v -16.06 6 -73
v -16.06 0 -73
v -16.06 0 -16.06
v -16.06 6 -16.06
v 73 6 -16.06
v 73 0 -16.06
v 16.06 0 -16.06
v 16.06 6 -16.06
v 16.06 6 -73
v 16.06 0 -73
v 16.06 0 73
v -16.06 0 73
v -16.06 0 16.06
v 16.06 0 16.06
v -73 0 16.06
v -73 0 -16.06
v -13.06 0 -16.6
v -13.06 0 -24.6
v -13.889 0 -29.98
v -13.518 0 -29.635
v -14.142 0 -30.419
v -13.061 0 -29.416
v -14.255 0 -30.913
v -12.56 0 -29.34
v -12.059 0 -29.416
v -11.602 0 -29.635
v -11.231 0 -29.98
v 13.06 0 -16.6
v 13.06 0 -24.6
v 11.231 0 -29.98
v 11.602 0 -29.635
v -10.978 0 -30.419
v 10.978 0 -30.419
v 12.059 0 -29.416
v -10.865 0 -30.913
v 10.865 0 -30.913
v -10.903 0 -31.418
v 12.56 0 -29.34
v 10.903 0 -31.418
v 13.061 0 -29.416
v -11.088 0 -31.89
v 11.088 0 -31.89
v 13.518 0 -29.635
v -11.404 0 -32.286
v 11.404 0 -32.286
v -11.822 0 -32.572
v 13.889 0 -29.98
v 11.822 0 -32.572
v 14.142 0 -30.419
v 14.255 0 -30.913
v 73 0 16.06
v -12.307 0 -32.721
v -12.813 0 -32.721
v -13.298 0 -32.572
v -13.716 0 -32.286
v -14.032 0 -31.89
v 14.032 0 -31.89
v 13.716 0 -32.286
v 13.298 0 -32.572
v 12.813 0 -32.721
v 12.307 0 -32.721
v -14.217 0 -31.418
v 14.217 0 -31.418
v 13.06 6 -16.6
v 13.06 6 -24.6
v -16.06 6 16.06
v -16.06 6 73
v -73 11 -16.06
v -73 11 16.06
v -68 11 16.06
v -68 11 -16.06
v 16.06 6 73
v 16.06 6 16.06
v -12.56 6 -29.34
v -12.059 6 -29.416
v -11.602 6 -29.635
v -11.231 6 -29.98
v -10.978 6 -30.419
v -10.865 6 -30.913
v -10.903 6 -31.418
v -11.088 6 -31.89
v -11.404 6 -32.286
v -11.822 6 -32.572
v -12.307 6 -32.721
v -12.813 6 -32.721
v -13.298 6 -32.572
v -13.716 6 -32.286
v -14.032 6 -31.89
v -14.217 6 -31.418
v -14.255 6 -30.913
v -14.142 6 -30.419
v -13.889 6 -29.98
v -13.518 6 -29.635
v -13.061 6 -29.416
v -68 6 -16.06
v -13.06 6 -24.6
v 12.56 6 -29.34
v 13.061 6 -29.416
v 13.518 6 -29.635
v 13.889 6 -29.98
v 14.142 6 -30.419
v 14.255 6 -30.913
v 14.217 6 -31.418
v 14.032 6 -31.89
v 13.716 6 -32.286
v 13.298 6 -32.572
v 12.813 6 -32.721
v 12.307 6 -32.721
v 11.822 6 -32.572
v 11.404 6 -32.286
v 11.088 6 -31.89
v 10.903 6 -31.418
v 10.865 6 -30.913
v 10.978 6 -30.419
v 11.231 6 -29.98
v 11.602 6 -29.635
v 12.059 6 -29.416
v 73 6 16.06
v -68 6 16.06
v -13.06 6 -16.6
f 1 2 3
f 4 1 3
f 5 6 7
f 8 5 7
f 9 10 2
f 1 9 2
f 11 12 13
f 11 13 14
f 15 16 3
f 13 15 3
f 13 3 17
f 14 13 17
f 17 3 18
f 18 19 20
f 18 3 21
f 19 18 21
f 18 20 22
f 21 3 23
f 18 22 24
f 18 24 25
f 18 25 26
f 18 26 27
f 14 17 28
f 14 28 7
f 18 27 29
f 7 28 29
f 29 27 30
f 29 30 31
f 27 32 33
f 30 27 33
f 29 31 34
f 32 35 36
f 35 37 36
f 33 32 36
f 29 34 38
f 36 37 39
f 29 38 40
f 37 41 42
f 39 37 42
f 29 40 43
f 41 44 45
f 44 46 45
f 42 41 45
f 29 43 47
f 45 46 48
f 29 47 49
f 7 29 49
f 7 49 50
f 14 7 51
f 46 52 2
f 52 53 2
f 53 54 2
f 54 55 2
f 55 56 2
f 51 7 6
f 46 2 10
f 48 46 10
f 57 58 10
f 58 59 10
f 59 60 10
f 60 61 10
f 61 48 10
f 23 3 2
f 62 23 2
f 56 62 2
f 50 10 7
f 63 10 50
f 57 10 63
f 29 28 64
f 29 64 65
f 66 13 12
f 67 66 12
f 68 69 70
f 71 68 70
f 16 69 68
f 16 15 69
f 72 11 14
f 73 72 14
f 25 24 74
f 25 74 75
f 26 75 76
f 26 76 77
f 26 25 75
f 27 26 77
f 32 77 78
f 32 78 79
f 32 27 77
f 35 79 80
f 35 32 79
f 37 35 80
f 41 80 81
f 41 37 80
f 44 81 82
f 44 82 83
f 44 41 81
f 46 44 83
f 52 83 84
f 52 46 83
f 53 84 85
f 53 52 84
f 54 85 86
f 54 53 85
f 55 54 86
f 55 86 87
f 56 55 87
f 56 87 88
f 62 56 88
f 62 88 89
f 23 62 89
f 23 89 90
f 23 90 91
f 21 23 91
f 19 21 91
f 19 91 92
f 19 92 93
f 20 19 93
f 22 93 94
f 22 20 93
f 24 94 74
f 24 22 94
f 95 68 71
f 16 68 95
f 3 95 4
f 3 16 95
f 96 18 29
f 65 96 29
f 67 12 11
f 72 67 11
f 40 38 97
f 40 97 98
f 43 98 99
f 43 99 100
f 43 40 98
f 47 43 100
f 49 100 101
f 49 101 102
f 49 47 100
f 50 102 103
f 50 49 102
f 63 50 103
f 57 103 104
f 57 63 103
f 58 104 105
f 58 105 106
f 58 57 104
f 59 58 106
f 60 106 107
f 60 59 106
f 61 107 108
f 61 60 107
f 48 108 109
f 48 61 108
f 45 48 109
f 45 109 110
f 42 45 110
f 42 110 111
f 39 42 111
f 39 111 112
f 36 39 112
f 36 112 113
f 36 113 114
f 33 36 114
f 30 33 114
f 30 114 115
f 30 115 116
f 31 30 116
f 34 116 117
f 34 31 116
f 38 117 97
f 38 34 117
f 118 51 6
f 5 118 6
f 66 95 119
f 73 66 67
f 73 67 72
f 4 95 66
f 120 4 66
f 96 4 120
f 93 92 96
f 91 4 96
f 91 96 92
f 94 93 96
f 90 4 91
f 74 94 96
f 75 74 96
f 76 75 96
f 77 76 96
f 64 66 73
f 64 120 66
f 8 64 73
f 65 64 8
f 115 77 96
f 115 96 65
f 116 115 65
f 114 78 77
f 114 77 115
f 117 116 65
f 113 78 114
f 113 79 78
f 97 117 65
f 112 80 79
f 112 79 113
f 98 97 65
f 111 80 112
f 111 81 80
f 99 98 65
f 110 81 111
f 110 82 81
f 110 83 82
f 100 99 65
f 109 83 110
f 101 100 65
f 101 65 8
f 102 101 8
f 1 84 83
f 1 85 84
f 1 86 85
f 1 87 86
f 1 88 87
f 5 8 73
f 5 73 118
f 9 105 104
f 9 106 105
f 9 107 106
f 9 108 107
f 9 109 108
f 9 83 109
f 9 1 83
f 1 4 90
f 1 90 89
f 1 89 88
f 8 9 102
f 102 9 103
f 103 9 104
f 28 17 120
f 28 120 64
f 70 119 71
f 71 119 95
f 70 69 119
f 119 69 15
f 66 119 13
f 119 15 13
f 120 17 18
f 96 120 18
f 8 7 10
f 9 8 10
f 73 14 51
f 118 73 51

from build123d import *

# Parameters (mm, degrees)
SKETCH21_R           = 1.7
SKETCH21_W           = 26.12
SKETCH21_H           = 8
BOSS_EXTRUDE18_DEPTH = 6
SKETCH22_W           = 5
SKETCH22_H           = 32.12
BOSS_EXTRUDE19_DEPTH = 5


with BuildPart() as part:
    # Sketch21 → Boss-Extrude18 (new body)
    with BuildSketch(Plane(origin=(0, 0, 0), x_dir=(1, 0, 0), z_dir=(0, 1, 0))):
        Polygon((0, 73), (-16.06, 73), (-16.06, 16.06), (-73, 16.06), (-73, 0), (-73, -16.06), (-16.06, -16.06), (-16.06, -73), (0, -73), (16.06, -73), (16.06, -16.06), (73, -16.06), (73, 0), (73, 16.06), (16.06, 16.06), (16.06, 73), align=None)
        with Locations(Location((-12.56, 31.04, 0), (0, 0, 270))):
            Circle(SKETCH21_R, mode=Mode.SUBTRACT)
        with Locations(Location((12.56, 31.04, 0), (0, 0, 270))):
            Circle(SKETCH21_R, mode=Mode.SUBTRACT)
        with Locations((0, 20.6)):
            Rectangle(SKETCH21_W, SKETCH21_H, mode=Mode.SUBTRACT)
    extrude(amount=BOSS_EXTRUDE18_DEPTH)

    # Sketch22 → Boss-Extrude19 (add)
    with BuildSketch(Plane(origin=(0, 6, 0), x_dir=(1, 0, 0), z_dir=(0, 1, 0))):
        with Locations((-70.5, 0)):
            Rectangle(SKETCH22_W, SKETCH22_H)
    extrude(amount=BOSS_EXTRUDE19_DEPTH)


solid = part.part
